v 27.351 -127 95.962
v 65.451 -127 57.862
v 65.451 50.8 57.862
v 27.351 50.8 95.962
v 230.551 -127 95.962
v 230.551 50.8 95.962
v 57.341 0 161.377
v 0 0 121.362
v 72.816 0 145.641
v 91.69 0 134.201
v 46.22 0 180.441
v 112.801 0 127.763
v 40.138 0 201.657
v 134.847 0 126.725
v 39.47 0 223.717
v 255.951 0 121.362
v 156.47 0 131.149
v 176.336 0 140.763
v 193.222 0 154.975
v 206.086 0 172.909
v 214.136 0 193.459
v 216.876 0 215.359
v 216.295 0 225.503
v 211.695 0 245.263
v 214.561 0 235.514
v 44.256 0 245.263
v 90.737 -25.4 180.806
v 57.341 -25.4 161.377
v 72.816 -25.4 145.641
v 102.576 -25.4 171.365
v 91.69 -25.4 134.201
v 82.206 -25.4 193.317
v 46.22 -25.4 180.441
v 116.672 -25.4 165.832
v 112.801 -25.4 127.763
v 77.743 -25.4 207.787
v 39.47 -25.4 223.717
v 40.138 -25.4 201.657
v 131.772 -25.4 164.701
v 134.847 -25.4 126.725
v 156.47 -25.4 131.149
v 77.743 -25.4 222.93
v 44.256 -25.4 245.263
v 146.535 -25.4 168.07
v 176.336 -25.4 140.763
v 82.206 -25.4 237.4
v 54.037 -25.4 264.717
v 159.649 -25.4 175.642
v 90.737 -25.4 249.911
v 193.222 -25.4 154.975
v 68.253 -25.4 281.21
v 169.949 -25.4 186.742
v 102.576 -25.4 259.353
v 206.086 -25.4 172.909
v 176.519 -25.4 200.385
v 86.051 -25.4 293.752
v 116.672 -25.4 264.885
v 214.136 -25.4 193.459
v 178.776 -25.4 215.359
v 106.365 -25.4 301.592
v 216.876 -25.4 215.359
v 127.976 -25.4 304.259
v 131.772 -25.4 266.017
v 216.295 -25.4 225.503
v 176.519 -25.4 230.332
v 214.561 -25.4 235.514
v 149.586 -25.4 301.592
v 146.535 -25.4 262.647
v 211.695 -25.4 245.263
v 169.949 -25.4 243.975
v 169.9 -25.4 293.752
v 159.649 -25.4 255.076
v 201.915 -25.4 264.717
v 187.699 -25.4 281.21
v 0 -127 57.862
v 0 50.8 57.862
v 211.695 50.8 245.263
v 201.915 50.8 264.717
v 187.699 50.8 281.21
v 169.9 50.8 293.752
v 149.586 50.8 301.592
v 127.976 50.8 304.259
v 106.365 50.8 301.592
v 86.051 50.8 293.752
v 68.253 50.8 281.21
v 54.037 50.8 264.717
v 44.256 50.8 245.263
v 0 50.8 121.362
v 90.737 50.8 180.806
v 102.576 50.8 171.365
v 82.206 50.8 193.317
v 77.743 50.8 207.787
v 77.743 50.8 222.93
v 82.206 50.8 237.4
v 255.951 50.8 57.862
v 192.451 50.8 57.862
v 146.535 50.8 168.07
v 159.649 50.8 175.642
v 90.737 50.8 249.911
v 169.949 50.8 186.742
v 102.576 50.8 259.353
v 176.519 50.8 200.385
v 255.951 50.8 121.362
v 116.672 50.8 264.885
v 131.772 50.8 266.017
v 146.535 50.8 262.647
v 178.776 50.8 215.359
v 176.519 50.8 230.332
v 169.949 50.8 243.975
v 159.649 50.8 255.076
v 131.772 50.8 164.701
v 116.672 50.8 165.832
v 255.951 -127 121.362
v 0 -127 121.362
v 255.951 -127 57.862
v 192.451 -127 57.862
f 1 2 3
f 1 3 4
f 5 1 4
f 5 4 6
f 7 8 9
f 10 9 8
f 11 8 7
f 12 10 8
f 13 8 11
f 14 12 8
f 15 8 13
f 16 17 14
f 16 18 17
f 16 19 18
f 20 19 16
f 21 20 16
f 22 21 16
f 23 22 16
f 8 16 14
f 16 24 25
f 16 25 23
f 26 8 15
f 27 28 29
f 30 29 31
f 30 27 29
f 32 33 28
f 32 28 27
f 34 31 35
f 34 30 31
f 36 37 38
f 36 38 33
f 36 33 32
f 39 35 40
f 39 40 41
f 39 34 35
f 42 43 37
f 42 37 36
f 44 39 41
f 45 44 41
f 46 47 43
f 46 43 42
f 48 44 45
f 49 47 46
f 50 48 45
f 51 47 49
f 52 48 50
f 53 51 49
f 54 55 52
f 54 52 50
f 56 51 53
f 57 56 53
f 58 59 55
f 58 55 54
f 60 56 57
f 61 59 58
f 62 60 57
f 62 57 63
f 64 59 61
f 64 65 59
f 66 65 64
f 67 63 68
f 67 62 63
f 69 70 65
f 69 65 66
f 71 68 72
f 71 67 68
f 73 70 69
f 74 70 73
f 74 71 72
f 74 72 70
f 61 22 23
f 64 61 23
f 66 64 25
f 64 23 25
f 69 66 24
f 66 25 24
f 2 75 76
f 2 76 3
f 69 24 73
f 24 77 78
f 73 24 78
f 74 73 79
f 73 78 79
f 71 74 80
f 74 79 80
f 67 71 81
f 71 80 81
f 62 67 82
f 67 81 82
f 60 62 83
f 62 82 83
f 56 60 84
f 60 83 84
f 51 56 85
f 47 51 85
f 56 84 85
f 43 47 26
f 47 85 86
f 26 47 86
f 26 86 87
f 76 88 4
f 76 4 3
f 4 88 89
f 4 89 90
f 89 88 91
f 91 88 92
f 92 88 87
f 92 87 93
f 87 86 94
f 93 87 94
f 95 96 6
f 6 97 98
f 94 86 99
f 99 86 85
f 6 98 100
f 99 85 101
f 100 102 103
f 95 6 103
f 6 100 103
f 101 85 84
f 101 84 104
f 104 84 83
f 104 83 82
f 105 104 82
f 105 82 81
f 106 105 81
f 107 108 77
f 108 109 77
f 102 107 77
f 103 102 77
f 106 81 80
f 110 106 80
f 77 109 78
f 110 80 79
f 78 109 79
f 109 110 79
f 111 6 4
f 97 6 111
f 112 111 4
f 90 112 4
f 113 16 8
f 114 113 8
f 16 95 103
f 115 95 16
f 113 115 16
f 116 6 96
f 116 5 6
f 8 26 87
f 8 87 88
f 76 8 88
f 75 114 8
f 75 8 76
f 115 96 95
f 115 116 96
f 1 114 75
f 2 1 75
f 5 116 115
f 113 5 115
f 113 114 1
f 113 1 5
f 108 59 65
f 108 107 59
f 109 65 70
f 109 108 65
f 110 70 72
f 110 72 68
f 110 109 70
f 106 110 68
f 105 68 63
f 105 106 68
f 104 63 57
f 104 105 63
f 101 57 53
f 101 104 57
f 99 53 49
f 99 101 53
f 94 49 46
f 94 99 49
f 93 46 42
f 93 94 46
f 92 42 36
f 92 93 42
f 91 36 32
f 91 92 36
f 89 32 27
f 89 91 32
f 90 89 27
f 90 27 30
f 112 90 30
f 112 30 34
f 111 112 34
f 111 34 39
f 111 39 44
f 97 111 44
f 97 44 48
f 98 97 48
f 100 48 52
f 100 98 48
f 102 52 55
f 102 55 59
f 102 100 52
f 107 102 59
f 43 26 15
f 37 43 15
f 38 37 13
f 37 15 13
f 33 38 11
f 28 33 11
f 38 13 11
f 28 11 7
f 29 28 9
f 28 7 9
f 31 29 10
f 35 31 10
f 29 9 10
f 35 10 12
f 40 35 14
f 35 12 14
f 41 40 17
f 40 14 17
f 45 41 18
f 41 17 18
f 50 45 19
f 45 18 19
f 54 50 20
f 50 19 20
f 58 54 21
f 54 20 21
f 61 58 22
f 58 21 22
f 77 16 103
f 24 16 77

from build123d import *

# Parameters (mm, degrees)
F1_DEPTH = 127
F0_R     = 50.8
F2_DEPTH = 50.8
F3_DEPTH = 25.4


with BuildPart() as f1:
    # F0 (on Front) → F1 (new body)
    with BuildSketch(Plane.XZ):
        Polygon((255.951391, 57.862211), (255.951391, 121.362211), (0, 121.362211), (0, 57.862211), (65.451391, 57.862211), (27.351391, 95.962211), (230.551391, 95.962211), (192.451391, 57.862211), align=None)
    extrude(amount=F1_DEPTH)

    # F0 (on Front) → F2 (join)
    with BuildSketch(Plane.XZ):
        Polygon((255.951391, 57.862211), (255.951391, 121.362211), (0, 121.362211), (0, 57.862211), (65.451391, 57.862211), (27.351391, 95.962211), (230.551391, 95.962211), (192.451391, 57.862211), align=None)
        with BuildLine():
            ThreePointArc((216.875695, 215.35869), (215.571015, 230.533337), (211.69527, 245.262584))
            ThreePointArc((211.69527, 245.262584), (127.975695, 304.25869), (44.256121, 245.262584))
            ThreePointArc((44.256121, 245.262584), (112.801048, 127.76337), (216.875695, 215.35869))
        make_face()
        with Locations((127.975695, 215.35869)):
            Circle(F0_R, mode=Mode.SUBTRACT)
        with BuildLine():
            Line((0, 121.362211), (255.951391, 121.362211))
            Line((255.951391, 121.362211), (211.69527, 245.262584))
            ThreePointArc((211.69527, 245.262584), (215.571015, 230.533337), (216.875695, 215.35869))
            ThreePointArc((216.875695, 215.35869), (112.801048, 127.76337), (44.256121, 245.262584))
            Line((44.256121, 245.262584), (0, 121.362211))
        make_face()
    extrude(amount=-F2_DEPTH)

    # F0 (on Front) → F3 (join)
    with BuildSketch(Plane.XZ):
        with BuildLine():
            ThreePointArc((216.875695, 215.35869), (215.571015, 230.533337), (211.69527, 245.262584))
            ThreePointArc((211.69527, 245.262584), (127.975695, 304.25869), (44.256121, 245.262584))
            ThreePointArc((44.256121, 245.262584), (112.801048, 127.76337), (216.875695, 215.35869))
        make_face()
        with Locations((127.975695, 215.35869)):
            Circle(F0_R, mode=Mode.SUBTRACT)
    extrude(amount=F3_DEPTH)


solid = f1.part
